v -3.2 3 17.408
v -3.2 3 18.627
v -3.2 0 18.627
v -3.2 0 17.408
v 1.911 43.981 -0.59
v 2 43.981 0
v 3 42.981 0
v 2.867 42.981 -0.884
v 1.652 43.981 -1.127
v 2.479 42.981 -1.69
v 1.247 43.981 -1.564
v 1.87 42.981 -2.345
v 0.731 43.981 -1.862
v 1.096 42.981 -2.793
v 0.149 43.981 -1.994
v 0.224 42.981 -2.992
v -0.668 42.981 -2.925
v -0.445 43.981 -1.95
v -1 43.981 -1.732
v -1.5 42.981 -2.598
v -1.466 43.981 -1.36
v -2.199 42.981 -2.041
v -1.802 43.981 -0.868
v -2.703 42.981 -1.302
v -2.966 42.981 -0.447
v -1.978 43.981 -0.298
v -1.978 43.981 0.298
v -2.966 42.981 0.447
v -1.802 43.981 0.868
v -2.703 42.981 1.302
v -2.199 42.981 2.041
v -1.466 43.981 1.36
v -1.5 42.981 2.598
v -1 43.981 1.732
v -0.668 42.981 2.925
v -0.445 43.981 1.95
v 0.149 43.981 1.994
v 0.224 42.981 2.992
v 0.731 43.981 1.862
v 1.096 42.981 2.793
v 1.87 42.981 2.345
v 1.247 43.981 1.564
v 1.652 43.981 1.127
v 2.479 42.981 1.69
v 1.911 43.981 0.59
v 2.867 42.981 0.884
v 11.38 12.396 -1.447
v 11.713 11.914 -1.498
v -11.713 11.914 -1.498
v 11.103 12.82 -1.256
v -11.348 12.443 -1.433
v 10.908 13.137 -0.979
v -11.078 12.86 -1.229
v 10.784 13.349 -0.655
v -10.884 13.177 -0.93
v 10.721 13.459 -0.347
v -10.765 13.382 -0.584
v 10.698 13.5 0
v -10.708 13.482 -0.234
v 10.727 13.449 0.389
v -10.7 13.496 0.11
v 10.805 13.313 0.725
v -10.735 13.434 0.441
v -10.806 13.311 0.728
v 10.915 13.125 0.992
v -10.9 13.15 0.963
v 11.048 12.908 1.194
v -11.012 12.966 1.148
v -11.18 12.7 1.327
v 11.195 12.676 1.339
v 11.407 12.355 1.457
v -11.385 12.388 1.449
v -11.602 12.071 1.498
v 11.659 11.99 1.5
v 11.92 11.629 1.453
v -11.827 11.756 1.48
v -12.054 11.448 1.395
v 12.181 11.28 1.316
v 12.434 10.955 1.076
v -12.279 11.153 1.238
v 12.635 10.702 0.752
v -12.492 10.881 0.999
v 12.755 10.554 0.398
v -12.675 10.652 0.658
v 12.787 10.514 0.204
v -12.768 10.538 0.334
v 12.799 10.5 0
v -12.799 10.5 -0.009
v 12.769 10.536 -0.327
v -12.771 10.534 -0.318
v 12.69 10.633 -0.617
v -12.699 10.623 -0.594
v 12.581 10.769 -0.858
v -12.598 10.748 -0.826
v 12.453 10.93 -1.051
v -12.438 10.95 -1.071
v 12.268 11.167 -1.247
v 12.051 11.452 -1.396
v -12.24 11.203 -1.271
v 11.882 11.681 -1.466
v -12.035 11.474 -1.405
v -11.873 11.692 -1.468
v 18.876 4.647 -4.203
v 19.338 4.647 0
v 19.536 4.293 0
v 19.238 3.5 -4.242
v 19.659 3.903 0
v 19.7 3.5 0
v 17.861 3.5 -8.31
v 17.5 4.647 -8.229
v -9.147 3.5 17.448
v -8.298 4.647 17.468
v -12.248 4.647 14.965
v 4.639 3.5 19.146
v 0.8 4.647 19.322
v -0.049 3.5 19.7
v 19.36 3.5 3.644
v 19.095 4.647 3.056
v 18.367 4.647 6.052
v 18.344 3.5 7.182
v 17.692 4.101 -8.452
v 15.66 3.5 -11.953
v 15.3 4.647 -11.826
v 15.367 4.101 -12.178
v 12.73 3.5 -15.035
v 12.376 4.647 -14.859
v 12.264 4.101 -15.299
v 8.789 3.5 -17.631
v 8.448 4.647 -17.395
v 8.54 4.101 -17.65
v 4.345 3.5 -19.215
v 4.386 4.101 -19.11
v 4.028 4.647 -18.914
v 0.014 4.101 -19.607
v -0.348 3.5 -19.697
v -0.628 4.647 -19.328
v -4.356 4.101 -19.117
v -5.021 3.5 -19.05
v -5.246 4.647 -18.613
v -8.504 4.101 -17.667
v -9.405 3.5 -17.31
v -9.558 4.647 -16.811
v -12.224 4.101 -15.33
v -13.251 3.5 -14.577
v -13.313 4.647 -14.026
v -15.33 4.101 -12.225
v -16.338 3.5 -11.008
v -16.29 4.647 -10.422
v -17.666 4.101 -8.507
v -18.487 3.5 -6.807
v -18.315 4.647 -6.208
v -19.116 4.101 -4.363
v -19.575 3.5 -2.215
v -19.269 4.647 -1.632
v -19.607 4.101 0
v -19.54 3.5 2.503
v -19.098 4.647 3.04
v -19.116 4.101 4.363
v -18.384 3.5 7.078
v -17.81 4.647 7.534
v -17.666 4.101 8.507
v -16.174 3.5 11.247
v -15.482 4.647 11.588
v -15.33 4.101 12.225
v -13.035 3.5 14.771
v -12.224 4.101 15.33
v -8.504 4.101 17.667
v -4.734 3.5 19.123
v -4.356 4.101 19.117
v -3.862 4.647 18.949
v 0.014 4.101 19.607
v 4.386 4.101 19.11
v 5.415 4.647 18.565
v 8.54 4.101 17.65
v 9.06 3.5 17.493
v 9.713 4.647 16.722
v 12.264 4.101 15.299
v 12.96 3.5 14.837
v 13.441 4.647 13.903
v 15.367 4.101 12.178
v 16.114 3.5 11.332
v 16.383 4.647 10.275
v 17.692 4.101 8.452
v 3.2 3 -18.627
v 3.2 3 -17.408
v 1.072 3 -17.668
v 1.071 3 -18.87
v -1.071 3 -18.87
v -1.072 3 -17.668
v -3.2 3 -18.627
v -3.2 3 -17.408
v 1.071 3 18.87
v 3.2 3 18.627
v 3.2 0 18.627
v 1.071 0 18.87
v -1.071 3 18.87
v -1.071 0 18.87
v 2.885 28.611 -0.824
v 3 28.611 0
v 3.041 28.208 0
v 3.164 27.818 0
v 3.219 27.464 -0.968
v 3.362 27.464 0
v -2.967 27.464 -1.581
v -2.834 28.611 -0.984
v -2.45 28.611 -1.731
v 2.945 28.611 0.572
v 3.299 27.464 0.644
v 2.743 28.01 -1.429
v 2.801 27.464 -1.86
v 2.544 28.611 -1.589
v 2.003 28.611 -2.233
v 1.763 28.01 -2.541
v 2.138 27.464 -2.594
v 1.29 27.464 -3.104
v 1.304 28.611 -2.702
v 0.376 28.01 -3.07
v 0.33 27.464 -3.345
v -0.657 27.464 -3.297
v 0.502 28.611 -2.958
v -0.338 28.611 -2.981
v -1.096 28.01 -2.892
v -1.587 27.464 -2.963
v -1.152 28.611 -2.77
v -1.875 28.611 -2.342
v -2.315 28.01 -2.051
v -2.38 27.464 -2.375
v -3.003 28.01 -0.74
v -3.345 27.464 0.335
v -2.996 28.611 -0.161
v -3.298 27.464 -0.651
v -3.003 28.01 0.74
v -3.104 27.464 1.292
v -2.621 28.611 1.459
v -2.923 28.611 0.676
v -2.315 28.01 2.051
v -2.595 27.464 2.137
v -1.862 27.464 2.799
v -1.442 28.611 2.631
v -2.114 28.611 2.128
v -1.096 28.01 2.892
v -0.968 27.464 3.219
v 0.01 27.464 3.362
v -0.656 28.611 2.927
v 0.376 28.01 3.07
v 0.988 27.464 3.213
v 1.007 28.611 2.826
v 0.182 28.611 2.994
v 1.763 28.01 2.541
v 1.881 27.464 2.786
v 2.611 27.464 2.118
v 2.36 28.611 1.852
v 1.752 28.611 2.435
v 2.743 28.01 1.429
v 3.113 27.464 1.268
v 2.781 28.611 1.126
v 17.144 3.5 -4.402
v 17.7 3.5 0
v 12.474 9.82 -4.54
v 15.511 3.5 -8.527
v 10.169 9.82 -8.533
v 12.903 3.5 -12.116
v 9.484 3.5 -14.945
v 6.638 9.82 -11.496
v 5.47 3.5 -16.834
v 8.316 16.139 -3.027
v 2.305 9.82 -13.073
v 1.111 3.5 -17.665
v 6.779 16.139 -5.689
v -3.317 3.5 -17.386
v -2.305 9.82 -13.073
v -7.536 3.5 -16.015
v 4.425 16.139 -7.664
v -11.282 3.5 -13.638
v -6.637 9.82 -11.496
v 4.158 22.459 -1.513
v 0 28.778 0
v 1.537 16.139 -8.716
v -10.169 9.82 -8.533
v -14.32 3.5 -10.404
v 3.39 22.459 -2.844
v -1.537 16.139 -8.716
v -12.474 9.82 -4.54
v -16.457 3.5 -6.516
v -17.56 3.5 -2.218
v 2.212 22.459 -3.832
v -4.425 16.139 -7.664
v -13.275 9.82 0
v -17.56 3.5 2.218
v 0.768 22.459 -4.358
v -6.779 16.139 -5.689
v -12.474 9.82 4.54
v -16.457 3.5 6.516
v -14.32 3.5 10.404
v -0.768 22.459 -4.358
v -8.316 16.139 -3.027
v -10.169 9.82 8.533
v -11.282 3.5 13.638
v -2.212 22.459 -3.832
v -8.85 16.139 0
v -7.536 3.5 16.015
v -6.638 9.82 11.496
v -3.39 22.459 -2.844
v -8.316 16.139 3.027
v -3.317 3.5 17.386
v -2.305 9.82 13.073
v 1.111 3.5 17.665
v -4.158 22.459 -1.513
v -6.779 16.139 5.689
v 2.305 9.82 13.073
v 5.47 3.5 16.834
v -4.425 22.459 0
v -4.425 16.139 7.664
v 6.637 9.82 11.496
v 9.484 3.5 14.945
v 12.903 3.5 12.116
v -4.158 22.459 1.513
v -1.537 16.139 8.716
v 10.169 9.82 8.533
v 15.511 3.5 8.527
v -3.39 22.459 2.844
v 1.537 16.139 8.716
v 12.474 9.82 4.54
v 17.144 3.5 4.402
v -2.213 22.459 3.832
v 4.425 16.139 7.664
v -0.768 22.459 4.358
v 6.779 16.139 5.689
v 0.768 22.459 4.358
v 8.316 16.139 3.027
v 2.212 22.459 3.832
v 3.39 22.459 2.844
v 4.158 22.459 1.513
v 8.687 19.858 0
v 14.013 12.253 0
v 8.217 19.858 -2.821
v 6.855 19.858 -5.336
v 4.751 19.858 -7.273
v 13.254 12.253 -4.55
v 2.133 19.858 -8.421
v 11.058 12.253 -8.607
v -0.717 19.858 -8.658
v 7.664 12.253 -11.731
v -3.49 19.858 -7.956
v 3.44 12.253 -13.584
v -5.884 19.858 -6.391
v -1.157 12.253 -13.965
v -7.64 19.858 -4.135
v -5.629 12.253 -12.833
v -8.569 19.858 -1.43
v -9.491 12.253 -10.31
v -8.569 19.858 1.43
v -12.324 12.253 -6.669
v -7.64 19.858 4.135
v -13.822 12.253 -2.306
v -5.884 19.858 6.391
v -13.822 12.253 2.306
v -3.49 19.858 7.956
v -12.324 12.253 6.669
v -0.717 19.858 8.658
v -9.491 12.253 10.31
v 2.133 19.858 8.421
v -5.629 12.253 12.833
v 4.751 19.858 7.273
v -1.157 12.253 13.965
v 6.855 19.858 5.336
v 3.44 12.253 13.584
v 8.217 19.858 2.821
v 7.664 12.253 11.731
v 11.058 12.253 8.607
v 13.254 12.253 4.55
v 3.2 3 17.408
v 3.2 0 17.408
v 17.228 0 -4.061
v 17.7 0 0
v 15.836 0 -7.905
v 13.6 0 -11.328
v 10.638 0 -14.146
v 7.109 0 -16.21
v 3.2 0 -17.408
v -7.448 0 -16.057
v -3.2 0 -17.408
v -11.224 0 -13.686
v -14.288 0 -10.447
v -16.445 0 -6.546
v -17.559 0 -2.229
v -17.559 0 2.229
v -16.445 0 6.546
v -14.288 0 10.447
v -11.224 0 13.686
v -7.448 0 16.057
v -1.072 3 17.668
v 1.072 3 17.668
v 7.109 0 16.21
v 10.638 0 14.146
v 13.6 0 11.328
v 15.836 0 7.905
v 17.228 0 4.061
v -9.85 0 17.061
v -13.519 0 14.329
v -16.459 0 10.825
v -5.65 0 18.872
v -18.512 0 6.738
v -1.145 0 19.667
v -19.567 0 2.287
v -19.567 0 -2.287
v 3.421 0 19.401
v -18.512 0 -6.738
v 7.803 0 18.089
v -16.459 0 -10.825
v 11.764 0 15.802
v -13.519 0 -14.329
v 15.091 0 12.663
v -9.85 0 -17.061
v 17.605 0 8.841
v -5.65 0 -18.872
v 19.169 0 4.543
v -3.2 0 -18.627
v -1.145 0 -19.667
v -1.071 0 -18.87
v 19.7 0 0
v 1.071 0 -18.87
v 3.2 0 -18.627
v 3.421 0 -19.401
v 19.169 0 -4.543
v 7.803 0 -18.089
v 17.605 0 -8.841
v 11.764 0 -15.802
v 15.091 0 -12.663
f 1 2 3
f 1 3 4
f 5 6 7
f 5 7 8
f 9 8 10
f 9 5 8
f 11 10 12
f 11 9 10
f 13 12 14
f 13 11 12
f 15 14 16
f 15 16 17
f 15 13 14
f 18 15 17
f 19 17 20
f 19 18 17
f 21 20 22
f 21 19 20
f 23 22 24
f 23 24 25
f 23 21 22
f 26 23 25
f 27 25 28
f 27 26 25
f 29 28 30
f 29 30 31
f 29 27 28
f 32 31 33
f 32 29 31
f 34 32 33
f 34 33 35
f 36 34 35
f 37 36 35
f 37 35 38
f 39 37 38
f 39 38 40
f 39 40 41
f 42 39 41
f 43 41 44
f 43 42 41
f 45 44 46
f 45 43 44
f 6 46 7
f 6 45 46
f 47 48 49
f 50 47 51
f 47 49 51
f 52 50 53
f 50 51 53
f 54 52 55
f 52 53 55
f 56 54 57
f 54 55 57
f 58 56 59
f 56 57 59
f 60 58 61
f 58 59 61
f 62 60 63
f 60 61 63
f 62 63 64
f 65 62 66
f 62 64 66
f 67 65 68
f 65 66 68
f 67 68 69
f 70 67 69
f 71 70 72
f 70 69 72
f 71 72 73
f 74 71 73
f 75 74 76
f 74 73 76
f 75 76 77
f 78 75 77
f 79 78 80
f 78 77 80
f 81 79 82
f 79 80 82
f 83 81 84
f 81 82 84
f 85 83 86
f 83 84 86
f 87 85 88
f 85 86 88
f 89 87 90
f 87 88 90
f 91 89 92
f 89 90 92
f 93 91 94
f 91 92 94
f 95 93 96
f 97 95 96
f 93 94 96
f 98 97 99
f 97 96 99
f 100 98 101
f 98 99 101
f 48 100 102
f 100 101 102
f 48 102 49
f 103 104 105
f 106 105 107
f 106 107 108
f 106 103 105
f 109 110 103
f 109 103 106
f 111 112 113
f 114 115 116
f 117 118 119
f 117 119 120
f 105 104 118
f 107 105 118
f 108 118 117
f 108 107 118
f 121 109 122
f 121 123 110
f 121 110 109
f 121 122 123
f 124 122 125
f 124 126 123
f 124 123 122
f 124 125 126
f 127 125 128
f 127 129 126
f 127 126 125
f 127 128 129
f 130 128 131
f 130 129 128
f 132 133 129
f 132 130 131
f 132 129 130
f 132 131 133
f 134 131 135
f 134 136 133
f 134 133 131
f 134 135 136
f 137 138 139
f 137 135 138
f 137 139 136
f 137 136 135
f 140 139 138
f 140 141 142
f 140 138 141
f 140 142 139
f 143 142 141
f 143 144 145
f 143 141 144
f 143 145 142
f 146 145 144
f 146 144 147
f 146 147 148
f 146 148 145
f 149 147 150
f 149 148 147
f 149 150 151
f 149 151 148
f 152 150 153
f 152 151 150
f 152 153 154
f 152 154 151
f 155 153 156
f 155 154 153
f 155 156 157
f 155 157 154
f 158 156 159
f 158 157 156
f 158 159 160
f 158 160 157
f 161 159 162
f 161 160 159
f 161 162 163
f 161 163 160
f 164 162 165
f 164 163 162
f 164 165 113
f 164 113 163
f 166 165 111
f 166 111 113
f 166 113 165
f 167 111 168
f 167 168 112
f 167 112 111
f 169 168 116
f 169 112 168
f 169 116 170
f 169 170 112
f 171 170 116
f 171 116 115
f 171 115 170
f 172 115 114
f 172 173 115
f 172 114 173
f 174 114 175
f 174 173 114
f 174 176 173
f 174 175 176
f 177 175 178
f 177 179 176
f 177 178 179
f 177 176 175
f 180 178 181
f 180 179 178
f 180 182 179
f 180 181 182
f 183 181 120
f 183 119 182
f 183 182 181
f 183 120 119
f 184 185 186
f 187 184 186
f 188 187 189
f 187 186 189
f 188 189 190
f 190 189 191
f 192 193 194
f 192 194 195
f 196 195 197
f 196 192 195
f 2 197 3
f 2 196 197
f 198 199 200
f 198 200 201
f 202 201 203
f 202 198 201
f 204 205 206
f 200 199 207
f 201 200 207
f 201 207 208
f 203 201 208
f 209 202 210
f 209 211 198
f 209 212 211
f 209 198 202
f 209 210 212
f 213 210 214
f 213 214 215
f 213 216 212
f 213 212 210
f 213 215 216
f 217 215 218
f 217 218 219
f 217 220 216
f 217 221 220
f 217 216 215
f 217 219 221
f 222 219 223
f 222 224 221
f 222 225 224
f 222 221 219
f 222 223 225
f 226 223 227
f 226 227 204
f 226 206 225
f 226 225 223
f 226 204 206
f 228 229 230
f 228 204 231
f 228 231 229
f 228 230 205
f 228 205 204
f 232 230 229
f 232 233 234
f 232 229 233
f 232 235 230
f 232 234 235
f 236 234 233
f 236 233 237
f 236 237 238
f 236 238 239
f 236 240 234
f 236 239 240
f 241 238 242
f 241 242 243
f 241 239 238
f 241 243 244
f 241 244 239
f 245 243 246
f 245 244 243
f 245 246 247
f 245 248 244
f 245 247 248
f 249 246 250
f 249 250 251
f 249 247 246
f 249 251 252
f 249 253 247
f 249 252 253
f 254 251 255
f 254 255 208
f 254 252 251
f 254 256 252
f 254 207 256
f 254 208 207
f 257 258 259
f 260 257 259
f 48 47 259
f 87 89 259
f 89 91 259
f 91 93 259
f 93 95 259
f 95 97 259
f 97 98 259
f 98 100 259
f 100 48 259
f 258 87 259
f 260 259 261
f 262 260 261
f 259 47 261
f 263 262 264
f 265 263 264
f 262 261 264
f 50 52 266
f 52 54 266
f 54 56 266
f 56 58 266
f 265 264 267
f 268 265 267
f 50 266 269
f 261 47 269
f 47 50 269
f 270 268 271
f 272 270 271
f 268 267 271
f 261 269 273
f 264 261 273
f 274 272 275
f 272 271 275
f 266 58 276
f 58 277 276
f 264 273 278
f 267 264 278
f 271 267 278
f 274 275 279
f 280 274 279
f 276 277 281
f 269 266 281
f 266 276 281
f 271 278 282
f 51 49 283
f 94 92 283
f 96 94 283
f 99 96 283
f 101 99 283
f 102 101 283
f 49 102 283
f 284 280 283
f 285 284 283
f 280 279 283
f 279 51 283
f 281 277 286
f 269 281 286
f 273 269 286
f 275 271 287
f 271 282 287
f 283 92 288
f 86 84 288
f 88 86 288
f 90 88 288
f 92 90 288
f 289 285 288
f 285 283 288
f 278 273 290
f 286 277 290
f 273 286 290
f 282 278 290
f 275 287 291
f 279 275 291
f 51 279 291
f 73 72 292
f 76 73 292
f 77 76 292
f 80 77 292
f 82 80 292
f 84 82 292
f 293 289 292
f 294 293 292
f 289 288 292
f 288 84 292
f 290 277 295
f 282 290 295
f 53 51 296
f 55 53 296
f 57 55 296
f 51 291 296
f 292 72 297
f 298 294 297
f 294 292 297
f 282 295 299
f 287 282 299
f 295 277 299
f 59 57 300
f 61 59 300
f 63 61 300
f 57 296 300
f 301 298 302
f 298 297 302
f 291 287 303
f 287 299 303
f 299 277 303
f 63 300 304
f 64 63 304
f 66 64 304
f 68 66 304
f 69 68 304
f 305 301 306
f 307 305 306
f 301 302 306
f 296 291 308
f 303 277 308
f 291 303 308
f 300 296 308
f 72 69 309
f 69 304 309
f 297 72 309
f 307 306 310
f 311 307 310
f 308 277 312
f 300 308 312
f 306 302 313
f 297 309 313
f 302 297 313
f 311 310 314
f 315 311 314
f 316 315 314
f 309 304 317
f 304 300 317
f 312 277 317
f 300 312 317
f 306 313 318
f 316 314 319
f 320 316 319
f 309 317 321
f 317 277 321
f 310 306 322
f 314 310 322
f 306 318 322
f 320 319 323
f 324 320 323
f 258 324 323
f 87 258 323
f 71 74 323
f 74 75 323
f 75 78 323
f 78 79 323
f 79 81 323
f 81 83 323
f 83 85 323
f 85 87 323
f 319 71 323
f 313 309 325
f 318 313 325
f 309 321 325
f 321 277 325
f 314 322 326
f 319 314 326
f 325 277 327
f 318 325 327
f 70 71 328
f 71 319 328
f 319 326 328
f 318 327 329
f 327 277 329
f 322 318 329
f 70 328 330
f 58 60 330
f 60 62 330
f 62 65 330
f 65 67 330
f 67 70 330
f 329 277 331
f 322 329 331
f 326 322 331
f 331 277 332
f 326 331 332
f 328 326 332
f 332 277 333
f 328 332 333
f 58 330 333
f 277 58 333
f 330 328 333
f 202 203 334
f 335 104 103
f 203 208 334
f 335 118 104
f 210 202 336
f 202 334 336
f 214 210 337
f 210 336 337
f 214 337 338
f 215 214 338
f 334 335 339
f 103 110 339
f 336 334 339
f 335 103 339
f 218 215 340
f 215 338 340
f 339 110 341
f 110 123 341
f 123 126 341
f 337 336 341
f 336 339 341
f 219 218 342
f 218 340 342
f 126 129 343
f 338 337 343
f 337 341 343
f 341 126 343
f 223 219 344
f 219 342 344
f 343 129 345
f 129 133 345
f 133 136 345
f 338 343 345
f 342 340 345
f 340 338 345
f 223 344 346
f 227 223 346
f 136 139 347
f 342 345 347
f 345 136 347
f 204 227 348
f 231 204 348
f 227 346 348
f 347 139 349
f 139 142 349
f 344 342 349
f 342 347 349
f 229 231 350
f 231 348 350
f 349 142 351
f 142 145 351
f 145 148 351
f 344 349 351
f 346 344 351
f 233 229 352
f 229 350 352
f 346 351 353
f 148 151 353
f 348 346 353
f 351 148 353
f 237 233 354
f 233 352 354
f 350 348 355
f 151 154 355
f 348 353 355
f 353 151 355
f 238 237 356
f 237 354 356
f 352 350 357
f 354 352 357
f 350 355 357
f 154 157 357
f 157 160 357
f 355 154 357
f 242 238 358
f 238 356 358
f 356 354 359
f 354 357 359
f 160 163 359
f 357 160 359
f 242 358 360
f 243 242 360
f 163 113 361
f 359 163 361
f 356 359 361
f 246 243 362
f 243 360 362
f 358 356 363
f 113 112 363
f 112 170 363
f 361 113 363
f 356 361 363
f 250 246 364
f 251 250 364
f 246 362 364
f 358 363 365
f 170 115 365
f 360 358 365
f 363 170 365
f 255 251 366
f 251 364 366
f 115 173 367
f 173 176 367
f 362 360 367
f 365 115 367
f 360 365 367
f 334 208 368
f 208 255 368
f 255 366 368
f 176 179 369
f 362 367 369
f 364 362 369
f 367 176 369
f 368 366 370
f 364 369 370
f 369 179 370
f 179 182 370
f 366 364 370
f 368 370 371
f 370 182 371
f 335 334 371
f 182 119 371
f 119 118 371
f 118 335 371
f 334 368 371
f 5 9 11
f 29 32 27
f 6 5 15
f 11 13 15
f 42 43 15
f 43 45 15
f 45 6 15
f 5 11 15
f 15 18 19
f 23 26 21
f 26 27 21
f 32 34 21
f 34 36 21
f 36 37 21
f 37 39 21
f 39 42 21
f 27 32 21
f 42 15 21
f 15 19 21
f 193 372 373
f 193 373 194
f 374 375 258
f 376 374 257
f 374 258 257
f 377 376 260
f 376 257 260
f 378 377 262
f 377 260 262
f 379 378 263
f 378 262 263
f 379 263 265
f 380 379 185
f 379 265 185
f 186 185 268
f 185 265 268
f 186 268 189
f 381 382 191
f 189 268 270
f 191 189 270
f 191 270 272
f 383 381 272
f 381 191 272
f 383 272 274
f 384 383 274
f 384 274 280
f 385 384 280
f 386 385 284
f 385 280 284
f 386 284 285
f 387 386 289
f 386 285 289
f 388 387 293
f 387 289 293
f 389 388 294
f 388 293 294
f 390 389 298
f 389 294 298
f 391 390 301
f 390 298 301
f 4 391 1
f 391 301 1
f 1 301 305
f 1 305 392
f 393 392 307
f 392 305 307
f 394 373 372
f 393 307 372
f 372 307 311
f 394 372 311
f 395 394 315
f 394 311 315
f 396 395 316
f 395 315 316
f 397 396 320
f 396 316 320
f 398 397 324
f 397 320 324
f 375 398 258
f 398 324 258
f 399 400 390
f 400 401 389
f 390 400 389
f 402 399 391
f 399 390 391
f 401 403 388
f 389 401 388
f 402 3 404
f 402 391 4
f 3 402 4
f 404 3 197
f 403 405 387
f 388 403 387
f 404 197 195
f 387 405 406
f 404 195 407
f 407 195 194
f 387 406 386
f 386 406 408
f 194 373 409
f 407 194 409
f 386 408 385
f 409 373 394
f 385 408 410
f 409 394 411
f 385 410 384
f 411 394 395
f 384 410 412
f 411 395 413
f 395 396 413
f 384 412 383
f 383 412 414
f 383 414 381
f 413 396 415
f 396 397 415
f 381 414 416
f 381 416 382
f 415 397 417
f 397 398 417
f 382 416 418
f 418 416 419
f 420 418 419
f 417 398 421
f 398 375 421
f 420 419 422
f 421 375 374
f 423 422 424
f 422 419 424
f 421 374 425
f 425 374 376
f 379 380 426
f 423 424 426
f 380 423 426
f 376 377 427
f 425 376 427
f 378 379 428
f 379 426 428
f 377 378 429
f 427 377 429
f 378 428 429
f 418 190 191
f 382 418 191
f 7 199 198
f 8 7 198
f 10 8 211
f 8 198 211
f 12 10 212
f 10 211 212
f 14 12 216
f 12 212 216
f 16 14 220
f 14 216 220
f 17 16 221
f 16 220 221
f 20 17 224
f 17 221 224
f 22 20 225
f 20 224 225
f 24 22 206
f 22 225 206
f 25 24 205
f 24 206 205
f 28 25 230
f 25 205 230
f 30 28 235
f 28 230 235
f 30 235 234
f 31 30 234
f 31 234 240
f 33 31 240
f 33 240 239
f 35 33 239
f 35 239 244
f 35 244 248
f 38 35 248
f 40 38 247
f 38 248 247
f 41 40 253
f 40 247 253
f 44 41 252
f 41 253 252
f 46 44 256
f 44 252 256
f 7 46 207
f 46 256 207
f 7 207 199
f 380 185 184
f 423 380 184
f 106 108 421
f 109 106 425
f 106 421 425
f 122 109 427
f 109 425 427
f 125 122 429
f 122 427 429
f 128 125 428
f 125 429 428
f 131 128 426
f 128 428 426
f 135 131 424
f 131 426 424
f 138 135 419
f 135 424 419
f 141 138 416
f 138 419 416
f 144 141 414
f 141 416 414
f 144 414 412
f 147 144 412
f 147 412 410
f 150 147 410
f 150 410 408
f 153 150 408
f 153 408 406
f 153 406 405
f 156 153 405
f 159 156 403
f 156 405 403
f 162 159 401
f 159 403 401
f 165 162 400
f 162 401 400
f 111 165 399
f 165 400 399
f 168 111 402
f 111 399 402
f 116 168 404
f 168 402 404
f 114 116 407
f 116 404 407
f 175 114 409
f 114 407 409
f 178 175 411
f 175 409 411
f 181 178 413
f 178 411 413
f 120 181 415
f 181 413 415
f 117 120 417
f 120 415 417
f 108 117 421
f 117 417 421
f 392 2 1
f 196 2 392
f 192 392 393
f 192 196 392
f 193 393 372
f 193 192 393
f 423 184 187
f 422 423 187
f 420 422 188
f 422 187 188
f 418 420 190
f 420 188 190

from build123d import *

# Parameters (mm, degrees)
FILLET1_R                       = 2
BOSS_EXTRUDE1_REACH             = 54.062
SKETCH2_R                       = 1.5
BOSS_EXTRUDE1_DIRECTION_2_REACH = 54.062
CHAMFER1_SIZE                   = 1
CUT_EXTRUDE1_START              = -3
CUT_EXTRUDE1_DEPTH              = 3


with BuildPart() as part:
    # Sketch1 → Revolve1 (revolve)
    with BuildSketch(Plane.XY):
        Polygon((17.7, 0), (17.7, 3.5), (0, 28.778219719), (0, 43.98066929), (3, 43.98066929), (3, 27.98066929), (19.7, 4.130597578), (19.7, 0), align=None)
    revolve(axis=Axis((0, 0, 0), (0, 1, 0)))

    # Fillet1
    fillet1_edges = [part.edges().sort_by_distance(p)[0] for p in [
        (-3, 27.98066929, 0),
        (-19.7, 4.130597578, 0),
    ]]
    fillet(fillet1_edges, radius=FILLET1_R)

    # Boss-Extrude1: up to this cone (the profile starts inside it)
    boss_extrude1_end = Plane(origin=(0, 12, 0), z_dir=(0, -1, 0)).offset(-16.778218719) * Cone(1e-06, 58.179162981, 83.088454645, align=(Align.CENTER, Align.CENTER, Align.MIN), mode=Mode.PRIVATE)
    # Sketch2 → Boss-Extrude1 (add, up to the surface)
    with BuildSketch(Plane(origin=(0, 0, 0), x_dir=(0, 0, -1), z_dir=(1, 0, 0)), mode=Mode.PRIVATE) as boss_extrude1_sk1:
        with Locations(Location((0, 12, 0), (0, 0, 356.704943747))):
            Circle(SKETCH2_R)
    boss_extrude1_tool1 = extrude(boss_extrude1_sk1.sketch, amount=BOSS_EXTRUDE1_REACH, mode=Mode.PRIVATE) & boss_extrude1_end
    add(boss_extrude1_tool1.solids().sort_by_distance((0, 12, 0))[0])

    # Boss-Extrude1 direction 2: up to this cone (the profile starts inside it)
    boss_extrude1_direction_2_end = Plane(origin=(0, 12, 0), z_dir=(0, -1, 0)).offset(-16.778218719) * Cone(1e-06, 58.179162981, 83.088454645, align=(Align.CENTER, Align.CENTER, Align.MIN), mode=Mode.PRIVATE)
    # Sketch2 → Boss-Extrude1 direction 2 (add, up to the surface)
    with BuildSketch(Plane(origin=(0, 0, 0), x_dir=(0, 0, -1), z_dir=(1, 0, 0)), mode=Mode.PRIVATE) as boss_extrude1_direction_2_sk1:
        with Locations(Location((0, 12, 0), (0, 0, 356.704943747))):
            Circle(SKETCH2_R)
    boss_extrude1_direction_2_tool1 = extrude(boss_extrude1_direction_2_sk1.sketch, amount=-BOSS_EXTRUDE1_DIRECTION_2_REACH, mode=Mode.PRIVATE) & boss_extrude1_direction_2_end
    add(boss_extrude1_direction_2_tool1.solids().sort_by_distance((0, 12, 0))[0])

    # Chamfer1
    chamfer1_edges = [part.edges().sort_by_distance(p)[0] for p in [
        (-3, 43.98066929, 0),
    ]]
    chamfer(chamfer1_edges, length=CHAMFER1_SIZE)

    # Sketch3 → Cut-Extrude1 (cut)
    with BuildSketch(Plane.XZ.offset(CUT_EXTRUDE1_START)):
        with BuildLine():
            Line((-3.2, 18.627130751), (-3.2, 17.408331339))
            ThreePointArc((-3.2, 17.408331339), (0, 17.7), (3.2, 17.408331339))
            Line((3.2, 17.408331339), (3.2, 18.627130751))
            ThreePointArc((3.2, 18.627130751), (0, 18.9), (-3.2, 18.627130751))
        make_face()
        with BuildLine():
            Line((3.2, -17.408331339), (3.2, -18.627130751))
            ThreePointArc((3.2, -18.627130751), (0, -18.9), (-3.2, -18.627130751))
            Line((-3.2, -18.627130751), (-3.2, -17.408331339))
            ThreePointArc((-3.2, -17.408331339), (0, -17.7), (3.2, -17.408331339))
        make_face()
    extrude(amount=CUT_EXTRUDE1_DEPTH, mode=Mode.SUBTRACT)


solid = part.part
